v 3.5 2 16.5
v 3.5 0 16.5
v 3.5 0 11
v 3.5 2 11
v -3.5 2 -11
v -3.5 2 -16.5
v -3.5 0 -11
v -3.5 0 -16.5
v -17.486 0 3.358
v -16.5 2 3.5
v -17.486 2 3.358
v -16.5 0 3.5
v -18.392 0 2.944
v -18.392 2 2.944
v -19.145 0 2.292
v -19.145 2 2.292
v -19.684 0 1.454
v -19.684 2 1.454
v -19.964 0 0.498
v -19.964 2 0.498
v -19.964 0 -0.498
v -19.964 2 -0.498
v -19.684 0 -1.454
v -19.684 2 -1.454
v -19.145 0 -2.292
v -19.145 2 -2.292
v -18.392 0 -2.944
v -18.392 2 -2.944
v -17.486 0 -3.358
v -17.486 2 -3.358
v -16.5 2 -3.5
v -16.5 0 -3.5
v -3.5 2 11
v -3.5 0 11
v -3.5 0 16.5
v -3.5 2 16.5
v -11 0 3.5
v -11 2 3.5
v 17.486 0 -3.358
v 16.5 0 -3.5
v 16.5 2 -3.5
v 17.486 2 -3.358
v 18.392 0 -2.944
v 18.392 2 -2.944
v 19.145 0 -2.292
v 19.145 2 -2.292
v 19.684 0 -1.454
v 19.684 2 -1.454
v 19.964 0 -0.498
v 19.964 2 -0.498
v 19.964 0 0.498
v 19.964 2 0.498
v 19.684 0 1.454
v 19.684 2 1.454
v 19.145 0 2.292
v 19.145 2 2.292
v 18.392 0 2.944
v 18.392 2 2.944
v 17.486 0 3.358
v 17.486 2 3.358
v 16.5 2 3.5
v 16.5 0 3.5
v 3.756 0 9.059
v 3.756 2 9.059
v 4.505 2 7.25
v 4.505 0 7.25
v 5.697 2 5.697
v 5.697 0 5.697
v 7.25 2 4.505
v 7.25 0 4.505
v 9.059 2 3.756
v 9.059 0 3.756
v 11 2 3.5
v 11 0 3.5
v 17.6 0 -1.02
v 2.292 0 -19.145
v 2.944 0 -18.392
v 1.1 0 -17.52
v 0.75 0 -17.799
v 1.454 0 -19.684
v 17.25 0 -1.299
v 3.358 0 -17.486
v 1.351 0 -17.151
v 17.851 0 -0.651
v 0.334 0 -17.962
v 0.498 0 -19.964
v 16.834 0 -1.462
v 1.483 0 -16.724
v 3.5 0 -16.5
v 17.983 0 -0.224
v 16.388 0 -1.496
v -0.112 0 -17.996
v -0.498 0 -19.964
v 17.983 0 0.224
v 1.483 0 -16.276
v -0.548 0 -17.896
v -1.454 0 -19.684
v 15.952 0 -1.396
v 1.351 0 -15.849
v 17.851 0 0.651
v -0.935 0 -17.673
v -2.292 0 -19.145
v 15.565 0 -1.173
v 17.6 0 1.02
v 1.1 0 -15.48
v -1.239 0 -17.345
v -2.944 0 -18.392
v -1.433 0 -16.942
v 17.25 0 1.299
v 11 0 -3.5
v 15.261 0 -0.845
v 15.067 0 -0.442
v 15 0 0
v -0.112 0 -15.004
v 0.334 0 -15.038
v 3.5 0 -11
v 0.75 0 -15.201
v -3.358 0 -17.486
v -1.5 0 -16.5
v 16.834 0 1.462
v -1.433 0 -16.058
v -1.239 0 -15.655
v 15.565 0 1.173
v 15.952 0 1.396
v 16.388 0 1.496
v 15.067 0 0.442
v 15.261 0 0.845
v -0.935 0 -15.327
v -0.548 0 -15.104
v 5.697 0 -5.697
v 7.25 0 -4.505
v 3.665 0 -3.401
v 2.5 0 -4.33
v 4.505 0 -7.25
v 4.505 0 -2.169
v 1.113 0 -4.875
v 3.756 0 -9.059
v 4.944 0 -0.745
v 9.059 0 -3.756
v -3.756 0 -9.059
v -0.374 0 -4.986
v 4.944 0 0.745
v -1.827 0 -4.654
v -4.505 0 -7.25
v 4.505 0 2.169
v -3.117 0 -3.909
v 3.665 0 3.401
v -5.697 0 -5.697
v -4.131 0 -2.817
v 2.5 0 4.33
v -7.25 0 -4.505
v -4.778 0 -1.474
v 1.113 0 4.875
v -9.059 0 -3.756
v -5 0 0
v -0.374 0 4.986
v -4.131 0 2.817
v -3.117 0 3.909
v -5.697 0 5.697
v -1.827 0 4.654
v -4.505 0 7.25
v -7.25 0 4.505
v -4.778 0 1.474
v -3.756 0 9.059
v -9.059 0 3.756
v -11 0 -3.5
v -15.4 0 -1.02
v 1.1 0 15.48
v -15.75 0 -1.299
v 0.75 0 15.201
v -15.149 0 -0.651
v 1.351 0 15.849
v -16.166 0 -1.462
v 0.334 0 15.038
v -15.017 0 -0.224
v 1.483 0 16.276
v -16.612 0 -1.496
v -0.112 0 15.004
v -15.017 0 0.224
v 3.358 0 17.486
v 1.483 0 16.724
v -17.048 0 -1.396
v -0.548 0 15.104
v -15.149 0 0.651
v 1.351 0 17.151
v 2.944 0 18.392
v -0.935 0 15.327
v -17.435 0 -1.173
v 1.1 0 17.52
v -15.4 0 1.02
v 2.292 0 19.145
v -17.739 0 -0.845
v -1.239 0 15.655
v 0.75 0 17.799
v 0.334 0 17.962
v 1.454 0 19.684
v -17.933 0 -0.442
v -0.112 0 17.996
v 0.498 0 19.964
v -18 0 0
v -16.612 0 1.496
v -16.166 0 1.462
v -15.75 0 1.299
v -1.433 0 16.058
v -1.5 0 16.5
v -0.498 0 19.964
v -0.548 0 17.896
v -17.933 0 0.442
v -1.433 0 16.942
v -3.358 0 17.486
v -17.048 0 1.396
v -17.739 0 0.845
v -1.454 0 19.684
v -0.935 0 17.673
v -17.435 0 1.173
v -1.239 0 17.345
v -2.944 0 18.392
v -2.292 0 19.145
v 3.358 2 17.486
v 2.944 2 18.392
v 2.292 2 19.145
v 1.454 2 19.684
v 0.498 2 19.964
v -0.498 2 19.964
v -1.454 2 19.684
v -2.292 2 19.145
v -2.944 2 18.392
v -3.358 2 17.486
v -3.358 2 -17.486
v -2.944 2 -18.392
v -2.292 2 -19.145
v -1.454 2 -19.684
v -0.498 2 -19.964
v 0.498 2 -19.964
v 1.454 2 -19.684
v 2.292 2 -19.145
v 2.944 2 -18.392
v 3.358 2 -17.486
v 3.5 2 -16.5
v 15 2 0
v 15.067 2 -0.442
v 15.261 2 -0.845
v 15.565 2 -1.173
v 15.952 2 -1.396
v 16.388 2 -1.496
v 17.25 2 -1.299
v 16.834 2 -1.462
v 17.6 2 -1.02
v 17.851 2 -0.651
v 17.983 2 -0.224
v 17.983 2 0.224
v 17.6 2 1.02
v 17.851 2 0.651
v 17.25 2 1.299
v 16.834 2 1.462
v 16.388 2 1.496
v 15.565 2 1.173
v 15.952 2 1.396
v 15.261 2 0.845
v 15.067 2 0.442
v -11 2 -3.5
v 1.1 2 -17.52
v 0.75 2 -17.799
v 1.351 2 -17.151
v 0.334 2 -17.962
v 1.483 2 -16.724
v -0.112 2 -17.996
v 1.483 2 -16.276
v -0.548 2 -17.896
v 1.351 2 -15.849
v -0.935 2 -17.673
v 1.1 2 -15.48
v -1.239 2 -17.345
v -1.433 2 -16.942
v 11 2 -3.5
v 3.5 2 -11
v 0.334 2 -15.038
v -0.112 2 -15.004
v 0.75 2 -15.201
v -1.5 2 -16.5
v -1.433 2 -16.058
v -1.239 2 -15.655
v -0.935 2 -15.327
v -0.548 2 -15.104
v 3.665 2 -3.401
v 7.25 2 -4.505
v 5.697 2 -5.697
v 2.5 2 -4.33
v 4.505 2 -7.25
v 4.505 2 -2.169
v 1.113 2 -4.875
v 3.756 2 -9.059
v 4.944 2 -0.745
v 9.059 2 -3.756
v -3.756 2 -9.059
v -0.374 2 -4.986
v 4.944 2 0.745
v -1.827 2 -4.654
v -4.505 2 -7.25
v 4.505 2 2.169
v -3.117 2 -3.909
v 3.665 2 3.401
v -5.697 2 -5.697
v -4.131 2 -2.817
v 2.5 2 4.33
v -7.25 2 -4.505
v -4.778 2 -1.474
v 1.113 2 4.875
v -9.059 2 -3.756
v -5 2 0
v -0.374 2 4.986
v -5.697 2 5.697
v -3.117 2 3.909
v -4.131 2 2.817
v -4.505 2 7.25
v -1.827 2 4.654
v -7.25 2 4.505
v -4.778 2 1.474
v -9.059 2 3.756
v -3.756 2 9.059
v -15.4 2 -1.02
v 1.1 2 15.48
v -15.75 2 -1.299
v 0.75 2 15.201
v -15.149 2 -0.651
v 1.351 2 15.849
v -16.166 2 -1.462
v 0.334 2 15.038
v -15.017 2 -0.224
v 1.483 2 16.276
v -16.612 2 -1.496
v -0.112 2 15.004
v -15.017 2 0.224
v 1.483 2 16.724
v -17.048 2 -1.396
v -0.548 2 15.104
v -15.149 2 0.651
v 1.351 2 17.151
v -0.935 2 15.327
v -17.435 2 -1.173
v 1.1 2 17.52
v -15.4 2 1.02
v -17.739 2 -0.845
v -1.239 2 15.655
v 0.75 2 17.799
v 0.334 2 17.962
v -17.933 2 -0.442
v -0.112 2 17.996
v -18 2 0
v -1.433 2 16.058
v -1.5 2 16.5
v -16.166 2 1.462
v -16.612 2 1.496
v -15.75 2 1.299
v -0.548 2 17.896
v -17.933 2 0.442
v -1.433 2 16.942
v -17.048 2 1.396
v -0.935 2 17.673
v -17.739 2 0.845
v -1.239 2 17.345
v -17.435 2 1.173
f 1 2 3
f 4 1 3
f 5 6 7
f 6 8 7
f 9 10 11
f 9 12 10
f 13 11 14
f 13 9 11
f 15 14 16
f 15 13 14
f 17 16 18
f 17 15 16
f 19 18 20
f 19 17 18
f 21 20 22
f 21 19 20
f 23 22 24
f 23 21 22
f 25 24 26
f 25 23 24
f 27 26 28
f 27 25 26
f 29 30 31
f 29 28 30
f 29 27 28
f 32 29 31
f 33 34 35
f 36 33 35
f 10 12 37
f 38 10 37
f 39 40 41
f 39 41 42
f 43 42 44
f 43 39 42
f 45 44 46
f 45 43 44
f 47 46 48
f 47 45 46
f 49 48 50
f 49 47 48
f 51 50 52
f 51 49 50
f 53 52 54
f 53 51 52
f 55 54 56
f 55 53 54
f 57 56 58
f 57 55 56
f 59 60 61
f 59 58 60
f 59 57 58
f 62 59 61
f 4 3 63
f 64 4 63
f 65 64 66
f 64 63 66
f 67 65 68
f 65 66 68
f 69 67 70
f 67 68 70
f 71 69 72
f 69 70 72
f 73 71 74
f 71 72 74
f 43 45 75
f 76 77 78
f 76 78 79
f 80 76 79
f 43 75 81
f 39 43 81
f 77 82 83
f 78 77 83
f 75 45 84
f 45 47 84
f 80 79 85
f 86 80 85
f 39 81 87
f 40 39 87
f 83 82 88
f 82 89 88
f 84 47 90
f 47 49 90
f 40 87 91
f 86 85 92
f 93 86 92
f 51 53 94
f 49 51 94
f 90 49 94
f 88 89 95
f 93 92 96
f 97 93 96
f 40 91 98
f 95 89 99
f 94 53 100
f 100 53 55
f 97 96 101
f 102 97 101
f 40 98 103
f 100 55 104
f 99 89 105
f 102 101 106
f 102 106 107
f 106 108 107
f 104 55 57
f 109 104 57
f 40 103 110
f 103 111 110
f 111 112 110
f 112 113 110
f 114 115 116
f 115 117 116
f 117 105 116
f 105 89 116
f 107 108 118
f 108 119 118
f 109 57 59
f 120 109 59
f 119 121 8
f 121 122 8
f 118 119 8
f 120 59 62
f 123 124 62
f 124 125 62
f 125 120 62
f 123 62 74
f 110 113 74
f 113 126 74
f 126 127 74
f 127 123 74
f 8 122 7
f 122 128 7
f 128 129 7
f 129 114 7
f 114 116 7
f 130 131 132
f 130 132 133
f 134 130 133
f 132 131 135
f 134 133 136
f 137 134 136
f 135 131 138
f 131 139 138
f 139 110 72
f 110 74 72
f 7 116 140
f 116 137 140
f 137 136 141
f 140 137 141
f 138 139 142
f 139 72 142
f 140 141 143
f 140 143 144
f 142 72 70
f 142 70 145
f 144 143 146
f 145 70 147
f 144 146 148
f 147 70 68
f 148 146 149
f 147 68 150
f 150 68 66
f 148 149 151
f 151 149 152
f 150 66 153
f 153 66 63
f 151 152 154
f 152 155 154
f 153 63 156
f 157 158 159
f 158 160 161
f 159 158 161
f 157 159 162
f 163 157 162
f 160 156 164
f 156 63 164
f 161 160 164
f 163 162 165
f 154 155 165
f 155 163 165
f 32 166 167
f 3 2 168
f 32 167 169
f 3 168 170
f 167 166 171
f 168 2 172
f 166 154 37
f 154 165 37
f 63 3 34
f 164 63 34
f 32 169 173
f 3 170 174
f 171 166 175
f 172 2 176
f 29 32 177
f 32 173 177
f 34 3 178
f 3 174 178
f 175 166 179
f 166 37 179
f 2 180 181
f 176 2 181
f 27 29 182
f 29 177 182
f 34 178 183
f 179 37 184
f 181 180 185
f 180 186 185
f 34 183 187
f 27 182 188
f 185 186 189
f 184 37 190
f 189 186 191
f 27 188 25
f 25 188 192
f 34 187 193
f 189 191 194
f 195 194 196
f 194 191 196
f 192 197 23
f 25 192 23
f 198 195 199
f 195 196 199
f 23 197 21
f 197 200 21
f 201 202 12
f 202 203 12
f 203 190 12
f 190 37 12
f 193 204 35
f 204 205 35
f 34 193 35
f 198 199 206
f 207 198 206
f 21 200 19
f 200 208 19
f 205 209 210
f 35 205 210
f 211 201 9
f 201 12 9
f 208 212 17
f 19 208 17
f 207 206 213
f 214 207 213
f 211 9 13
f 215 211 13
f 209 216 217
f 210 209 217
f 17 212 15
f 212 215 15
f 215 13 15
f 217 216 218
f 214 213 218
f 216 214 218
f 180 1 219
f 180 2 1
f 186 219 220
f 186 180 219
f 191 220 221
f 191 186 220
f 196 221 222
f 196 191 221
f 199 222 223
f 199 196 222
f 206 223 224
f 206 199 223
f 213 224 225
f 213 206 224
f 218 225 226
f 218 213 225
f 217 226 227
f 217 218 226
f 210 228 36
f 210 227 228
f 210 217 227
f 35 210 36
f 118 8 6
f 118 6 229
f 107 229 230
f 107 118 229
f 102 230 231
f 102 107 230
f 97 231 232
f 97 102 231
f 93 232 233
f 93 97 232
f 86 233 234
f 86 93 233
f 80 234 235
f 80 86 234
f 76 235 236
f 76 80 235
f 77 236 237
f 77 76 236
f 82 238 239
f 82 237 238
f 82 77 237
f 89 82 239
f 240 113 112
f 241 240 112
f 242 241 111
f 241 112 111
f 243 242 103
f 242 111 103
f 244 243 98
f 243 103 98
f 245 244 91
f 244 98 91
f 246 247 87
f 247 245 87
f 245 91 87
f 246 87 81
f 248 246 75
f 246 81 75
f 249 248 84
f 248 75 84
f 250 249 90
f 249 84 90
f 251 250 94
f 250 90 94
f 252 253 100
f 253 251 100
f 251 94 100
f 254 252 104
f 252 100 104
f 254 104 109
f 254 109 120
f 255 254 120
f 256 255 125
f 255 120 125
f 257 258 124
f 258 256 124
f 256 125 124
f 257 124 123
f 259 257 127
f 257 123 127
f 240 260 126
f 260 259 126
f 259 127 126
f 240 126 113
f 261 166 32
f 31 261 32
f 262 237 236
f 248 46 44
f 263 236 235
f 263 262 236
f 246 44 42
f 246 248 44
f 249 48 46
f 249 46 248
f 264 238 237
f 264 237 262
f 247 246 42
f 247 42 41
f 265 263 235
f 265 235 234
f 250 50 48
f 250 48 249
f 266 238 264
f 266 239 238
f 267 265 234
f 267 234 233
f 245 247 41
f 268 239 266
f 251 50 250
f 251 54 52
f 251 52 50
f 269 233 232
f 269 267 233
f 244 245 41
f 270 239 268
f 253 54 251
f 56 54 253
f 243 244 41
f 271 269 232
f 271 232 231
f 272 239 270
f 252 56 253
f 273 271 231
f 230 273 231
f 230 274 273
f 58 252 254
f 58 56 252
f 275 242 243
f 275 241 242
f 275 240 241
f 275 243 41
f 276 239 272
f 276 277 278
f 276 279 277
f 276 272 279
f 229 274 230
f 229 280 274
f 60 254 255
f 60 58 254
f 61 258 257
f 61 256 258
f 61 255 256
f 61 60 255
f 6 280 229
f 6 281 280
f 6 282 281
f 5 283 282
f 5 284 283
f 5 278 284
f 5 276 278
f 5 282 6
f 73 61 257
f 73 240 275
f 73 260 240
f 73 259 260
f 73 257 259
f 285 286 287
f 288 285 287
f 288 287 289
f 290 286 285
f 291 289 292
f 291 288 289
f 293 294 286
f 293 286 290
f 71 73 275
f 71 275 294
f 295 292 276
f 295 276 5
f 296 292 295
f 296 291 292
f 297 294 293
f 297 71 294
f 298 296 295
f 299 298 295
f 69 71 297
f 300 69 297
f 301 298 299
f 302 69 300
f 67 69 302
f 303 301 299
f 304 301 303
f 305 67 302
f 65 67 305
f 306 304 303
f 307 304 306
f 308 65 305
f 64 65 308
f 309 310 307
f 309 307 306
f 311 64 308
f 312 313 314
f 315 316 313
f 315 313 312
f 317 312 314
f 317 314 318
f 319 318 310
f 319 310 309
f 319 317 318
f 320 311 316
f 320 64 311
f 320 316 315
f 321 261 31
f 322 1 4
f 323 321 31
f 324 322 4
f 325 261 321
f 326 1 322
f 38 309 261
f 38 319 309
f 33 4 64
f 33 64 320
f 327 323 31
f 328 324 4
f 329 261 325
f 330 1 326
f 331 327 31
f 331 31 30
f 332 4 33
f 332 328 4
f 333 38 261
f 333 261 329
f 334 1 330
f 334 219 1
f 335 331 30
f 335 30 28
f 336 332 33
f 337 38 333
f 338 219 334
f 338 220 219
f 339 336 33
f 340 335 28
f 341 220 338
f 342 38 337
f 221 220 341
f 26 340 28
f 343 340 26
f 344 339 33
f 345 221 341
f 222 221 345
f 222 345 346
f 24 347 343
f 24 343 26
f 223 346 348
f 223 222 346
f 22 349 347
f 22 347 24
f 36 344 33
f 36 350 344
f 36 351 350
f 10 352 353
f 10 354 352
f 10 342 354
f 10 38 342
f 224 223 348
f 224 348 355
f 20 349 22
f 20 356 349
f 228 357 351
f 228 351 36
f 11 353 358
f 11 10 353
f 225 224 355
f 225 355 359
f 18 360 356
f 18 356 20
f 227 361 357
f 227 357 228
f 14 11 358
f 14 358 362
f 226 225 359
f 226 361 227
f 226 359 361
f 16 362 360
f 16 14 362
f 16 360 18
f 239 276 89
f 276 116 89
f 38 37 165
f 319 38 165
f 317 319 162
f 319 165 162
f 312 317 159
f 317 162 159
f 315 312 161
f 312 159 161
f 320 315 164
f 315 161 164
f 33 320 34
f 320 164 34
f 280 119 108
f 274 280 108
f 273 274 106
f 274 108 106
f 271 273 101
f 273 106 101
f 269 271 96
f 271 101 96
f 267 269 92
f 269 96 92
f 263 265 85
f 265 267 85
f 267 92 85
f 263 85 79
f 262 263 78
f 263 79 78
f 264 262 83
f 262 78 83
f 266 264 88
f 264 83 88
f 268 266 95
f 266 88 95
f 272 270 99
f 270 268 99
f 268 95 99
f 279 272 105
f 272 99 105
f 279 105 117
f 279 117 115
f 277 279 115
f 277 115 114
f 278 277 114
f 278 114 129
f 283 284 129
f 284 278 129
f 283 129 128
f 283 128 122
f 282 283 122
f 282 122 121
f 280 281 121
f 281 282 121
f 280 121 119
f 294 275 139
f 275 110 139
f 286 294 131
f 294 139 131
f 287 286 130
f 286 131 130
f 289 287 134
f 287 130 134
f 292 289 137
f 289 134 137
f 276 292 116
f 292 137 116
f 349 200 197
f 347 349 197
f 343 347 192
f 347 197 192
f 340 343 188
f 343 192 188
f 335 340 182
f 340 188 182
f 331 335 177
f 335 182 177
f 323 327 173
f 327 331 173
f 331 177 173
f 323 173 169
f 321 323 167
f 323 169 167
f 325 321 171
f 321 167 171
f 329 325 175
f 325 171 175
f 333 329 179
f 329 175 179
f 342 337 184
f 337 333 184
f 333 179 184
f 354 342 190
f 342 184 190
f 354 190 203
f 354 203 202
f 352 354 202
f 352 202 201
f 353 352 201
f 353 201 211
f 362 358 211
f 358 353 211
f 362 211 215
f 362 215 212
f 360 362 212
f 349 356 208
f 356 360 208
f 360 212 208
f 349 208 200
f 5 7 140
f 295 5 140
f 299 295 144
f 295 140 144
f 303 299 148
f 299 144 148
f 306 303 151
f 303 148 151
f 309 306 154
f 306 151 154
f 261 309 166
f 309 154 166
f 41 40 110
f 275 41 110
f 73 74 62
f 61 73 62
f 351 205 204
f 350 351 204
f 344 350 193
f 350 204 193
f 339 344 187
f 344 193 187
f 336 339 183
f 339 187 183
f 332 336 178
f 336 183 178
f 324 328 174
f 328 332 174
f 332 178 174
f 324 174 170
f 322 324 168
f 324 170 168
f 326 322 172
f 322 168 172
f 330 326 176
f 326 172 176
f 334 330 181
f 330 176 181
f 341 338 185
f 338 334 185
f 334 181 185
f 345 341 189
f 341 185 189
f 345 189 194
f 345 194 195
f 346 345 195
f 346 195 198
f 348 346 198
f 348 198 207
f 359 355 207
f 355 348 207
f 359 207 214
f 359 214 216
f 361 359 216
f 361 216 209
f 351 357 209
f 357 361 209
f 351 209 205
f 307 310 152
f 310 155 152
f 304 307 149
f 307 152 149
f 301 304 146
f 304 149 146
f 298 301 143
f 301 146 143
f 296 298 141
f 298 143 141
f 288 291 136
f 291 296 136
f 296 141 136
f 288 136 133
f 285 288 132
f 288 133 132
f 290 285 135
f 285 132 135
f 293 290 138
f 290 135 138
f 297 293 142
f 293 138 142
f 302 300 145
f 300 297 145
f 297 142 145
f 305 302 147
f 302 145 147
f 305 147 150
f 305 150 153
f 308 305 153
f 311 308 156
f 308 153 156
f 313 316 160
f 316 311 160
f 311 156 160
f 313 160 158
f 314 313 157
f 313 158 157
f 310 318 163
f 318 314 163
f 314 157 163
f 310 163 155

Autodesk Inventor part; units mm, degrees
ref_plane "YZ Plane" through (0, 0, 0) normal (1, 0, 0) x (0, 1, 0)
ref_plane "XZ Plane" through (0, 0, 0) normal (0, 1, 0) x (-1, 0, 0)
ref_plane "XY Plane" through (0, 0, 0) normal (0, 0, 1) x (1, 0, 0)
sketch "Boceto1" plane through (0, 0, 0) normal (0, 1, 0) x (-1, 0, 0)
  circle A0 centre (16.5, 0) radius 1.5
  circle A1 centre (0, -16.5) radius 1.5
  circle A2 centre (-16.5, 0) radius 1.5
  circle A3 centre (0, 16.5) radius 1.5
  line L0 (3.5, 11) -> (3.5, 16.5)
  line L1 (3.5, -16.5) -> (3.5, -11)
  line L2 (11, -3.5) -> (16.5, -3.5)
  line L3 (-16.5, -3.5) -> (-11, -3.5)
  arc A4 (3.5, 16.5) -> (-3.5, 16.5) centre (0, 16.5) ccw
  arc A5 (16.5, -3.5) -> (16.5, 3.5) centre (16.5, 0) ccw
  arc A6 (-3.5, -16.5) -> (3.5, -16.5) centre (0, -16.5) ccw
  arc A7 (-16.5, 3.5) -> (-16.5, -3.5) centre (-16.5, 0) ccw
  line L4 (16.5, 3.5) -> (11, 3.5)
  line L5 (-11, 3.5) -> (-16.5, 3.5)
  line L6 (-3.5, 16.5) -> (-3.5, 11)
  line L7 (-3.5, -11) -> (-3.5, -16.5)
  arc A8 (11, -3.5) -> (3.5, -11) centre (11, -11) ccw
  arc A9 (-3.5, -11) -> (-11, -3.5) centre (-11, -11) ccw
  arc A10 (-11, 3.5) -> (-3.5, 11) centre (-11, 11) ccw
  arc A11 (3.5, 11) -> (11, 3.5) centre (11, 11) ccw
  circle A12 centre (0, 0) radius 5
  dimension "d12" = 7.5
  dimension "d15" = 10
extrude "Extrusión1" add sketch "Boceto1" along normal blind 2
properties part number "Base Motor"
